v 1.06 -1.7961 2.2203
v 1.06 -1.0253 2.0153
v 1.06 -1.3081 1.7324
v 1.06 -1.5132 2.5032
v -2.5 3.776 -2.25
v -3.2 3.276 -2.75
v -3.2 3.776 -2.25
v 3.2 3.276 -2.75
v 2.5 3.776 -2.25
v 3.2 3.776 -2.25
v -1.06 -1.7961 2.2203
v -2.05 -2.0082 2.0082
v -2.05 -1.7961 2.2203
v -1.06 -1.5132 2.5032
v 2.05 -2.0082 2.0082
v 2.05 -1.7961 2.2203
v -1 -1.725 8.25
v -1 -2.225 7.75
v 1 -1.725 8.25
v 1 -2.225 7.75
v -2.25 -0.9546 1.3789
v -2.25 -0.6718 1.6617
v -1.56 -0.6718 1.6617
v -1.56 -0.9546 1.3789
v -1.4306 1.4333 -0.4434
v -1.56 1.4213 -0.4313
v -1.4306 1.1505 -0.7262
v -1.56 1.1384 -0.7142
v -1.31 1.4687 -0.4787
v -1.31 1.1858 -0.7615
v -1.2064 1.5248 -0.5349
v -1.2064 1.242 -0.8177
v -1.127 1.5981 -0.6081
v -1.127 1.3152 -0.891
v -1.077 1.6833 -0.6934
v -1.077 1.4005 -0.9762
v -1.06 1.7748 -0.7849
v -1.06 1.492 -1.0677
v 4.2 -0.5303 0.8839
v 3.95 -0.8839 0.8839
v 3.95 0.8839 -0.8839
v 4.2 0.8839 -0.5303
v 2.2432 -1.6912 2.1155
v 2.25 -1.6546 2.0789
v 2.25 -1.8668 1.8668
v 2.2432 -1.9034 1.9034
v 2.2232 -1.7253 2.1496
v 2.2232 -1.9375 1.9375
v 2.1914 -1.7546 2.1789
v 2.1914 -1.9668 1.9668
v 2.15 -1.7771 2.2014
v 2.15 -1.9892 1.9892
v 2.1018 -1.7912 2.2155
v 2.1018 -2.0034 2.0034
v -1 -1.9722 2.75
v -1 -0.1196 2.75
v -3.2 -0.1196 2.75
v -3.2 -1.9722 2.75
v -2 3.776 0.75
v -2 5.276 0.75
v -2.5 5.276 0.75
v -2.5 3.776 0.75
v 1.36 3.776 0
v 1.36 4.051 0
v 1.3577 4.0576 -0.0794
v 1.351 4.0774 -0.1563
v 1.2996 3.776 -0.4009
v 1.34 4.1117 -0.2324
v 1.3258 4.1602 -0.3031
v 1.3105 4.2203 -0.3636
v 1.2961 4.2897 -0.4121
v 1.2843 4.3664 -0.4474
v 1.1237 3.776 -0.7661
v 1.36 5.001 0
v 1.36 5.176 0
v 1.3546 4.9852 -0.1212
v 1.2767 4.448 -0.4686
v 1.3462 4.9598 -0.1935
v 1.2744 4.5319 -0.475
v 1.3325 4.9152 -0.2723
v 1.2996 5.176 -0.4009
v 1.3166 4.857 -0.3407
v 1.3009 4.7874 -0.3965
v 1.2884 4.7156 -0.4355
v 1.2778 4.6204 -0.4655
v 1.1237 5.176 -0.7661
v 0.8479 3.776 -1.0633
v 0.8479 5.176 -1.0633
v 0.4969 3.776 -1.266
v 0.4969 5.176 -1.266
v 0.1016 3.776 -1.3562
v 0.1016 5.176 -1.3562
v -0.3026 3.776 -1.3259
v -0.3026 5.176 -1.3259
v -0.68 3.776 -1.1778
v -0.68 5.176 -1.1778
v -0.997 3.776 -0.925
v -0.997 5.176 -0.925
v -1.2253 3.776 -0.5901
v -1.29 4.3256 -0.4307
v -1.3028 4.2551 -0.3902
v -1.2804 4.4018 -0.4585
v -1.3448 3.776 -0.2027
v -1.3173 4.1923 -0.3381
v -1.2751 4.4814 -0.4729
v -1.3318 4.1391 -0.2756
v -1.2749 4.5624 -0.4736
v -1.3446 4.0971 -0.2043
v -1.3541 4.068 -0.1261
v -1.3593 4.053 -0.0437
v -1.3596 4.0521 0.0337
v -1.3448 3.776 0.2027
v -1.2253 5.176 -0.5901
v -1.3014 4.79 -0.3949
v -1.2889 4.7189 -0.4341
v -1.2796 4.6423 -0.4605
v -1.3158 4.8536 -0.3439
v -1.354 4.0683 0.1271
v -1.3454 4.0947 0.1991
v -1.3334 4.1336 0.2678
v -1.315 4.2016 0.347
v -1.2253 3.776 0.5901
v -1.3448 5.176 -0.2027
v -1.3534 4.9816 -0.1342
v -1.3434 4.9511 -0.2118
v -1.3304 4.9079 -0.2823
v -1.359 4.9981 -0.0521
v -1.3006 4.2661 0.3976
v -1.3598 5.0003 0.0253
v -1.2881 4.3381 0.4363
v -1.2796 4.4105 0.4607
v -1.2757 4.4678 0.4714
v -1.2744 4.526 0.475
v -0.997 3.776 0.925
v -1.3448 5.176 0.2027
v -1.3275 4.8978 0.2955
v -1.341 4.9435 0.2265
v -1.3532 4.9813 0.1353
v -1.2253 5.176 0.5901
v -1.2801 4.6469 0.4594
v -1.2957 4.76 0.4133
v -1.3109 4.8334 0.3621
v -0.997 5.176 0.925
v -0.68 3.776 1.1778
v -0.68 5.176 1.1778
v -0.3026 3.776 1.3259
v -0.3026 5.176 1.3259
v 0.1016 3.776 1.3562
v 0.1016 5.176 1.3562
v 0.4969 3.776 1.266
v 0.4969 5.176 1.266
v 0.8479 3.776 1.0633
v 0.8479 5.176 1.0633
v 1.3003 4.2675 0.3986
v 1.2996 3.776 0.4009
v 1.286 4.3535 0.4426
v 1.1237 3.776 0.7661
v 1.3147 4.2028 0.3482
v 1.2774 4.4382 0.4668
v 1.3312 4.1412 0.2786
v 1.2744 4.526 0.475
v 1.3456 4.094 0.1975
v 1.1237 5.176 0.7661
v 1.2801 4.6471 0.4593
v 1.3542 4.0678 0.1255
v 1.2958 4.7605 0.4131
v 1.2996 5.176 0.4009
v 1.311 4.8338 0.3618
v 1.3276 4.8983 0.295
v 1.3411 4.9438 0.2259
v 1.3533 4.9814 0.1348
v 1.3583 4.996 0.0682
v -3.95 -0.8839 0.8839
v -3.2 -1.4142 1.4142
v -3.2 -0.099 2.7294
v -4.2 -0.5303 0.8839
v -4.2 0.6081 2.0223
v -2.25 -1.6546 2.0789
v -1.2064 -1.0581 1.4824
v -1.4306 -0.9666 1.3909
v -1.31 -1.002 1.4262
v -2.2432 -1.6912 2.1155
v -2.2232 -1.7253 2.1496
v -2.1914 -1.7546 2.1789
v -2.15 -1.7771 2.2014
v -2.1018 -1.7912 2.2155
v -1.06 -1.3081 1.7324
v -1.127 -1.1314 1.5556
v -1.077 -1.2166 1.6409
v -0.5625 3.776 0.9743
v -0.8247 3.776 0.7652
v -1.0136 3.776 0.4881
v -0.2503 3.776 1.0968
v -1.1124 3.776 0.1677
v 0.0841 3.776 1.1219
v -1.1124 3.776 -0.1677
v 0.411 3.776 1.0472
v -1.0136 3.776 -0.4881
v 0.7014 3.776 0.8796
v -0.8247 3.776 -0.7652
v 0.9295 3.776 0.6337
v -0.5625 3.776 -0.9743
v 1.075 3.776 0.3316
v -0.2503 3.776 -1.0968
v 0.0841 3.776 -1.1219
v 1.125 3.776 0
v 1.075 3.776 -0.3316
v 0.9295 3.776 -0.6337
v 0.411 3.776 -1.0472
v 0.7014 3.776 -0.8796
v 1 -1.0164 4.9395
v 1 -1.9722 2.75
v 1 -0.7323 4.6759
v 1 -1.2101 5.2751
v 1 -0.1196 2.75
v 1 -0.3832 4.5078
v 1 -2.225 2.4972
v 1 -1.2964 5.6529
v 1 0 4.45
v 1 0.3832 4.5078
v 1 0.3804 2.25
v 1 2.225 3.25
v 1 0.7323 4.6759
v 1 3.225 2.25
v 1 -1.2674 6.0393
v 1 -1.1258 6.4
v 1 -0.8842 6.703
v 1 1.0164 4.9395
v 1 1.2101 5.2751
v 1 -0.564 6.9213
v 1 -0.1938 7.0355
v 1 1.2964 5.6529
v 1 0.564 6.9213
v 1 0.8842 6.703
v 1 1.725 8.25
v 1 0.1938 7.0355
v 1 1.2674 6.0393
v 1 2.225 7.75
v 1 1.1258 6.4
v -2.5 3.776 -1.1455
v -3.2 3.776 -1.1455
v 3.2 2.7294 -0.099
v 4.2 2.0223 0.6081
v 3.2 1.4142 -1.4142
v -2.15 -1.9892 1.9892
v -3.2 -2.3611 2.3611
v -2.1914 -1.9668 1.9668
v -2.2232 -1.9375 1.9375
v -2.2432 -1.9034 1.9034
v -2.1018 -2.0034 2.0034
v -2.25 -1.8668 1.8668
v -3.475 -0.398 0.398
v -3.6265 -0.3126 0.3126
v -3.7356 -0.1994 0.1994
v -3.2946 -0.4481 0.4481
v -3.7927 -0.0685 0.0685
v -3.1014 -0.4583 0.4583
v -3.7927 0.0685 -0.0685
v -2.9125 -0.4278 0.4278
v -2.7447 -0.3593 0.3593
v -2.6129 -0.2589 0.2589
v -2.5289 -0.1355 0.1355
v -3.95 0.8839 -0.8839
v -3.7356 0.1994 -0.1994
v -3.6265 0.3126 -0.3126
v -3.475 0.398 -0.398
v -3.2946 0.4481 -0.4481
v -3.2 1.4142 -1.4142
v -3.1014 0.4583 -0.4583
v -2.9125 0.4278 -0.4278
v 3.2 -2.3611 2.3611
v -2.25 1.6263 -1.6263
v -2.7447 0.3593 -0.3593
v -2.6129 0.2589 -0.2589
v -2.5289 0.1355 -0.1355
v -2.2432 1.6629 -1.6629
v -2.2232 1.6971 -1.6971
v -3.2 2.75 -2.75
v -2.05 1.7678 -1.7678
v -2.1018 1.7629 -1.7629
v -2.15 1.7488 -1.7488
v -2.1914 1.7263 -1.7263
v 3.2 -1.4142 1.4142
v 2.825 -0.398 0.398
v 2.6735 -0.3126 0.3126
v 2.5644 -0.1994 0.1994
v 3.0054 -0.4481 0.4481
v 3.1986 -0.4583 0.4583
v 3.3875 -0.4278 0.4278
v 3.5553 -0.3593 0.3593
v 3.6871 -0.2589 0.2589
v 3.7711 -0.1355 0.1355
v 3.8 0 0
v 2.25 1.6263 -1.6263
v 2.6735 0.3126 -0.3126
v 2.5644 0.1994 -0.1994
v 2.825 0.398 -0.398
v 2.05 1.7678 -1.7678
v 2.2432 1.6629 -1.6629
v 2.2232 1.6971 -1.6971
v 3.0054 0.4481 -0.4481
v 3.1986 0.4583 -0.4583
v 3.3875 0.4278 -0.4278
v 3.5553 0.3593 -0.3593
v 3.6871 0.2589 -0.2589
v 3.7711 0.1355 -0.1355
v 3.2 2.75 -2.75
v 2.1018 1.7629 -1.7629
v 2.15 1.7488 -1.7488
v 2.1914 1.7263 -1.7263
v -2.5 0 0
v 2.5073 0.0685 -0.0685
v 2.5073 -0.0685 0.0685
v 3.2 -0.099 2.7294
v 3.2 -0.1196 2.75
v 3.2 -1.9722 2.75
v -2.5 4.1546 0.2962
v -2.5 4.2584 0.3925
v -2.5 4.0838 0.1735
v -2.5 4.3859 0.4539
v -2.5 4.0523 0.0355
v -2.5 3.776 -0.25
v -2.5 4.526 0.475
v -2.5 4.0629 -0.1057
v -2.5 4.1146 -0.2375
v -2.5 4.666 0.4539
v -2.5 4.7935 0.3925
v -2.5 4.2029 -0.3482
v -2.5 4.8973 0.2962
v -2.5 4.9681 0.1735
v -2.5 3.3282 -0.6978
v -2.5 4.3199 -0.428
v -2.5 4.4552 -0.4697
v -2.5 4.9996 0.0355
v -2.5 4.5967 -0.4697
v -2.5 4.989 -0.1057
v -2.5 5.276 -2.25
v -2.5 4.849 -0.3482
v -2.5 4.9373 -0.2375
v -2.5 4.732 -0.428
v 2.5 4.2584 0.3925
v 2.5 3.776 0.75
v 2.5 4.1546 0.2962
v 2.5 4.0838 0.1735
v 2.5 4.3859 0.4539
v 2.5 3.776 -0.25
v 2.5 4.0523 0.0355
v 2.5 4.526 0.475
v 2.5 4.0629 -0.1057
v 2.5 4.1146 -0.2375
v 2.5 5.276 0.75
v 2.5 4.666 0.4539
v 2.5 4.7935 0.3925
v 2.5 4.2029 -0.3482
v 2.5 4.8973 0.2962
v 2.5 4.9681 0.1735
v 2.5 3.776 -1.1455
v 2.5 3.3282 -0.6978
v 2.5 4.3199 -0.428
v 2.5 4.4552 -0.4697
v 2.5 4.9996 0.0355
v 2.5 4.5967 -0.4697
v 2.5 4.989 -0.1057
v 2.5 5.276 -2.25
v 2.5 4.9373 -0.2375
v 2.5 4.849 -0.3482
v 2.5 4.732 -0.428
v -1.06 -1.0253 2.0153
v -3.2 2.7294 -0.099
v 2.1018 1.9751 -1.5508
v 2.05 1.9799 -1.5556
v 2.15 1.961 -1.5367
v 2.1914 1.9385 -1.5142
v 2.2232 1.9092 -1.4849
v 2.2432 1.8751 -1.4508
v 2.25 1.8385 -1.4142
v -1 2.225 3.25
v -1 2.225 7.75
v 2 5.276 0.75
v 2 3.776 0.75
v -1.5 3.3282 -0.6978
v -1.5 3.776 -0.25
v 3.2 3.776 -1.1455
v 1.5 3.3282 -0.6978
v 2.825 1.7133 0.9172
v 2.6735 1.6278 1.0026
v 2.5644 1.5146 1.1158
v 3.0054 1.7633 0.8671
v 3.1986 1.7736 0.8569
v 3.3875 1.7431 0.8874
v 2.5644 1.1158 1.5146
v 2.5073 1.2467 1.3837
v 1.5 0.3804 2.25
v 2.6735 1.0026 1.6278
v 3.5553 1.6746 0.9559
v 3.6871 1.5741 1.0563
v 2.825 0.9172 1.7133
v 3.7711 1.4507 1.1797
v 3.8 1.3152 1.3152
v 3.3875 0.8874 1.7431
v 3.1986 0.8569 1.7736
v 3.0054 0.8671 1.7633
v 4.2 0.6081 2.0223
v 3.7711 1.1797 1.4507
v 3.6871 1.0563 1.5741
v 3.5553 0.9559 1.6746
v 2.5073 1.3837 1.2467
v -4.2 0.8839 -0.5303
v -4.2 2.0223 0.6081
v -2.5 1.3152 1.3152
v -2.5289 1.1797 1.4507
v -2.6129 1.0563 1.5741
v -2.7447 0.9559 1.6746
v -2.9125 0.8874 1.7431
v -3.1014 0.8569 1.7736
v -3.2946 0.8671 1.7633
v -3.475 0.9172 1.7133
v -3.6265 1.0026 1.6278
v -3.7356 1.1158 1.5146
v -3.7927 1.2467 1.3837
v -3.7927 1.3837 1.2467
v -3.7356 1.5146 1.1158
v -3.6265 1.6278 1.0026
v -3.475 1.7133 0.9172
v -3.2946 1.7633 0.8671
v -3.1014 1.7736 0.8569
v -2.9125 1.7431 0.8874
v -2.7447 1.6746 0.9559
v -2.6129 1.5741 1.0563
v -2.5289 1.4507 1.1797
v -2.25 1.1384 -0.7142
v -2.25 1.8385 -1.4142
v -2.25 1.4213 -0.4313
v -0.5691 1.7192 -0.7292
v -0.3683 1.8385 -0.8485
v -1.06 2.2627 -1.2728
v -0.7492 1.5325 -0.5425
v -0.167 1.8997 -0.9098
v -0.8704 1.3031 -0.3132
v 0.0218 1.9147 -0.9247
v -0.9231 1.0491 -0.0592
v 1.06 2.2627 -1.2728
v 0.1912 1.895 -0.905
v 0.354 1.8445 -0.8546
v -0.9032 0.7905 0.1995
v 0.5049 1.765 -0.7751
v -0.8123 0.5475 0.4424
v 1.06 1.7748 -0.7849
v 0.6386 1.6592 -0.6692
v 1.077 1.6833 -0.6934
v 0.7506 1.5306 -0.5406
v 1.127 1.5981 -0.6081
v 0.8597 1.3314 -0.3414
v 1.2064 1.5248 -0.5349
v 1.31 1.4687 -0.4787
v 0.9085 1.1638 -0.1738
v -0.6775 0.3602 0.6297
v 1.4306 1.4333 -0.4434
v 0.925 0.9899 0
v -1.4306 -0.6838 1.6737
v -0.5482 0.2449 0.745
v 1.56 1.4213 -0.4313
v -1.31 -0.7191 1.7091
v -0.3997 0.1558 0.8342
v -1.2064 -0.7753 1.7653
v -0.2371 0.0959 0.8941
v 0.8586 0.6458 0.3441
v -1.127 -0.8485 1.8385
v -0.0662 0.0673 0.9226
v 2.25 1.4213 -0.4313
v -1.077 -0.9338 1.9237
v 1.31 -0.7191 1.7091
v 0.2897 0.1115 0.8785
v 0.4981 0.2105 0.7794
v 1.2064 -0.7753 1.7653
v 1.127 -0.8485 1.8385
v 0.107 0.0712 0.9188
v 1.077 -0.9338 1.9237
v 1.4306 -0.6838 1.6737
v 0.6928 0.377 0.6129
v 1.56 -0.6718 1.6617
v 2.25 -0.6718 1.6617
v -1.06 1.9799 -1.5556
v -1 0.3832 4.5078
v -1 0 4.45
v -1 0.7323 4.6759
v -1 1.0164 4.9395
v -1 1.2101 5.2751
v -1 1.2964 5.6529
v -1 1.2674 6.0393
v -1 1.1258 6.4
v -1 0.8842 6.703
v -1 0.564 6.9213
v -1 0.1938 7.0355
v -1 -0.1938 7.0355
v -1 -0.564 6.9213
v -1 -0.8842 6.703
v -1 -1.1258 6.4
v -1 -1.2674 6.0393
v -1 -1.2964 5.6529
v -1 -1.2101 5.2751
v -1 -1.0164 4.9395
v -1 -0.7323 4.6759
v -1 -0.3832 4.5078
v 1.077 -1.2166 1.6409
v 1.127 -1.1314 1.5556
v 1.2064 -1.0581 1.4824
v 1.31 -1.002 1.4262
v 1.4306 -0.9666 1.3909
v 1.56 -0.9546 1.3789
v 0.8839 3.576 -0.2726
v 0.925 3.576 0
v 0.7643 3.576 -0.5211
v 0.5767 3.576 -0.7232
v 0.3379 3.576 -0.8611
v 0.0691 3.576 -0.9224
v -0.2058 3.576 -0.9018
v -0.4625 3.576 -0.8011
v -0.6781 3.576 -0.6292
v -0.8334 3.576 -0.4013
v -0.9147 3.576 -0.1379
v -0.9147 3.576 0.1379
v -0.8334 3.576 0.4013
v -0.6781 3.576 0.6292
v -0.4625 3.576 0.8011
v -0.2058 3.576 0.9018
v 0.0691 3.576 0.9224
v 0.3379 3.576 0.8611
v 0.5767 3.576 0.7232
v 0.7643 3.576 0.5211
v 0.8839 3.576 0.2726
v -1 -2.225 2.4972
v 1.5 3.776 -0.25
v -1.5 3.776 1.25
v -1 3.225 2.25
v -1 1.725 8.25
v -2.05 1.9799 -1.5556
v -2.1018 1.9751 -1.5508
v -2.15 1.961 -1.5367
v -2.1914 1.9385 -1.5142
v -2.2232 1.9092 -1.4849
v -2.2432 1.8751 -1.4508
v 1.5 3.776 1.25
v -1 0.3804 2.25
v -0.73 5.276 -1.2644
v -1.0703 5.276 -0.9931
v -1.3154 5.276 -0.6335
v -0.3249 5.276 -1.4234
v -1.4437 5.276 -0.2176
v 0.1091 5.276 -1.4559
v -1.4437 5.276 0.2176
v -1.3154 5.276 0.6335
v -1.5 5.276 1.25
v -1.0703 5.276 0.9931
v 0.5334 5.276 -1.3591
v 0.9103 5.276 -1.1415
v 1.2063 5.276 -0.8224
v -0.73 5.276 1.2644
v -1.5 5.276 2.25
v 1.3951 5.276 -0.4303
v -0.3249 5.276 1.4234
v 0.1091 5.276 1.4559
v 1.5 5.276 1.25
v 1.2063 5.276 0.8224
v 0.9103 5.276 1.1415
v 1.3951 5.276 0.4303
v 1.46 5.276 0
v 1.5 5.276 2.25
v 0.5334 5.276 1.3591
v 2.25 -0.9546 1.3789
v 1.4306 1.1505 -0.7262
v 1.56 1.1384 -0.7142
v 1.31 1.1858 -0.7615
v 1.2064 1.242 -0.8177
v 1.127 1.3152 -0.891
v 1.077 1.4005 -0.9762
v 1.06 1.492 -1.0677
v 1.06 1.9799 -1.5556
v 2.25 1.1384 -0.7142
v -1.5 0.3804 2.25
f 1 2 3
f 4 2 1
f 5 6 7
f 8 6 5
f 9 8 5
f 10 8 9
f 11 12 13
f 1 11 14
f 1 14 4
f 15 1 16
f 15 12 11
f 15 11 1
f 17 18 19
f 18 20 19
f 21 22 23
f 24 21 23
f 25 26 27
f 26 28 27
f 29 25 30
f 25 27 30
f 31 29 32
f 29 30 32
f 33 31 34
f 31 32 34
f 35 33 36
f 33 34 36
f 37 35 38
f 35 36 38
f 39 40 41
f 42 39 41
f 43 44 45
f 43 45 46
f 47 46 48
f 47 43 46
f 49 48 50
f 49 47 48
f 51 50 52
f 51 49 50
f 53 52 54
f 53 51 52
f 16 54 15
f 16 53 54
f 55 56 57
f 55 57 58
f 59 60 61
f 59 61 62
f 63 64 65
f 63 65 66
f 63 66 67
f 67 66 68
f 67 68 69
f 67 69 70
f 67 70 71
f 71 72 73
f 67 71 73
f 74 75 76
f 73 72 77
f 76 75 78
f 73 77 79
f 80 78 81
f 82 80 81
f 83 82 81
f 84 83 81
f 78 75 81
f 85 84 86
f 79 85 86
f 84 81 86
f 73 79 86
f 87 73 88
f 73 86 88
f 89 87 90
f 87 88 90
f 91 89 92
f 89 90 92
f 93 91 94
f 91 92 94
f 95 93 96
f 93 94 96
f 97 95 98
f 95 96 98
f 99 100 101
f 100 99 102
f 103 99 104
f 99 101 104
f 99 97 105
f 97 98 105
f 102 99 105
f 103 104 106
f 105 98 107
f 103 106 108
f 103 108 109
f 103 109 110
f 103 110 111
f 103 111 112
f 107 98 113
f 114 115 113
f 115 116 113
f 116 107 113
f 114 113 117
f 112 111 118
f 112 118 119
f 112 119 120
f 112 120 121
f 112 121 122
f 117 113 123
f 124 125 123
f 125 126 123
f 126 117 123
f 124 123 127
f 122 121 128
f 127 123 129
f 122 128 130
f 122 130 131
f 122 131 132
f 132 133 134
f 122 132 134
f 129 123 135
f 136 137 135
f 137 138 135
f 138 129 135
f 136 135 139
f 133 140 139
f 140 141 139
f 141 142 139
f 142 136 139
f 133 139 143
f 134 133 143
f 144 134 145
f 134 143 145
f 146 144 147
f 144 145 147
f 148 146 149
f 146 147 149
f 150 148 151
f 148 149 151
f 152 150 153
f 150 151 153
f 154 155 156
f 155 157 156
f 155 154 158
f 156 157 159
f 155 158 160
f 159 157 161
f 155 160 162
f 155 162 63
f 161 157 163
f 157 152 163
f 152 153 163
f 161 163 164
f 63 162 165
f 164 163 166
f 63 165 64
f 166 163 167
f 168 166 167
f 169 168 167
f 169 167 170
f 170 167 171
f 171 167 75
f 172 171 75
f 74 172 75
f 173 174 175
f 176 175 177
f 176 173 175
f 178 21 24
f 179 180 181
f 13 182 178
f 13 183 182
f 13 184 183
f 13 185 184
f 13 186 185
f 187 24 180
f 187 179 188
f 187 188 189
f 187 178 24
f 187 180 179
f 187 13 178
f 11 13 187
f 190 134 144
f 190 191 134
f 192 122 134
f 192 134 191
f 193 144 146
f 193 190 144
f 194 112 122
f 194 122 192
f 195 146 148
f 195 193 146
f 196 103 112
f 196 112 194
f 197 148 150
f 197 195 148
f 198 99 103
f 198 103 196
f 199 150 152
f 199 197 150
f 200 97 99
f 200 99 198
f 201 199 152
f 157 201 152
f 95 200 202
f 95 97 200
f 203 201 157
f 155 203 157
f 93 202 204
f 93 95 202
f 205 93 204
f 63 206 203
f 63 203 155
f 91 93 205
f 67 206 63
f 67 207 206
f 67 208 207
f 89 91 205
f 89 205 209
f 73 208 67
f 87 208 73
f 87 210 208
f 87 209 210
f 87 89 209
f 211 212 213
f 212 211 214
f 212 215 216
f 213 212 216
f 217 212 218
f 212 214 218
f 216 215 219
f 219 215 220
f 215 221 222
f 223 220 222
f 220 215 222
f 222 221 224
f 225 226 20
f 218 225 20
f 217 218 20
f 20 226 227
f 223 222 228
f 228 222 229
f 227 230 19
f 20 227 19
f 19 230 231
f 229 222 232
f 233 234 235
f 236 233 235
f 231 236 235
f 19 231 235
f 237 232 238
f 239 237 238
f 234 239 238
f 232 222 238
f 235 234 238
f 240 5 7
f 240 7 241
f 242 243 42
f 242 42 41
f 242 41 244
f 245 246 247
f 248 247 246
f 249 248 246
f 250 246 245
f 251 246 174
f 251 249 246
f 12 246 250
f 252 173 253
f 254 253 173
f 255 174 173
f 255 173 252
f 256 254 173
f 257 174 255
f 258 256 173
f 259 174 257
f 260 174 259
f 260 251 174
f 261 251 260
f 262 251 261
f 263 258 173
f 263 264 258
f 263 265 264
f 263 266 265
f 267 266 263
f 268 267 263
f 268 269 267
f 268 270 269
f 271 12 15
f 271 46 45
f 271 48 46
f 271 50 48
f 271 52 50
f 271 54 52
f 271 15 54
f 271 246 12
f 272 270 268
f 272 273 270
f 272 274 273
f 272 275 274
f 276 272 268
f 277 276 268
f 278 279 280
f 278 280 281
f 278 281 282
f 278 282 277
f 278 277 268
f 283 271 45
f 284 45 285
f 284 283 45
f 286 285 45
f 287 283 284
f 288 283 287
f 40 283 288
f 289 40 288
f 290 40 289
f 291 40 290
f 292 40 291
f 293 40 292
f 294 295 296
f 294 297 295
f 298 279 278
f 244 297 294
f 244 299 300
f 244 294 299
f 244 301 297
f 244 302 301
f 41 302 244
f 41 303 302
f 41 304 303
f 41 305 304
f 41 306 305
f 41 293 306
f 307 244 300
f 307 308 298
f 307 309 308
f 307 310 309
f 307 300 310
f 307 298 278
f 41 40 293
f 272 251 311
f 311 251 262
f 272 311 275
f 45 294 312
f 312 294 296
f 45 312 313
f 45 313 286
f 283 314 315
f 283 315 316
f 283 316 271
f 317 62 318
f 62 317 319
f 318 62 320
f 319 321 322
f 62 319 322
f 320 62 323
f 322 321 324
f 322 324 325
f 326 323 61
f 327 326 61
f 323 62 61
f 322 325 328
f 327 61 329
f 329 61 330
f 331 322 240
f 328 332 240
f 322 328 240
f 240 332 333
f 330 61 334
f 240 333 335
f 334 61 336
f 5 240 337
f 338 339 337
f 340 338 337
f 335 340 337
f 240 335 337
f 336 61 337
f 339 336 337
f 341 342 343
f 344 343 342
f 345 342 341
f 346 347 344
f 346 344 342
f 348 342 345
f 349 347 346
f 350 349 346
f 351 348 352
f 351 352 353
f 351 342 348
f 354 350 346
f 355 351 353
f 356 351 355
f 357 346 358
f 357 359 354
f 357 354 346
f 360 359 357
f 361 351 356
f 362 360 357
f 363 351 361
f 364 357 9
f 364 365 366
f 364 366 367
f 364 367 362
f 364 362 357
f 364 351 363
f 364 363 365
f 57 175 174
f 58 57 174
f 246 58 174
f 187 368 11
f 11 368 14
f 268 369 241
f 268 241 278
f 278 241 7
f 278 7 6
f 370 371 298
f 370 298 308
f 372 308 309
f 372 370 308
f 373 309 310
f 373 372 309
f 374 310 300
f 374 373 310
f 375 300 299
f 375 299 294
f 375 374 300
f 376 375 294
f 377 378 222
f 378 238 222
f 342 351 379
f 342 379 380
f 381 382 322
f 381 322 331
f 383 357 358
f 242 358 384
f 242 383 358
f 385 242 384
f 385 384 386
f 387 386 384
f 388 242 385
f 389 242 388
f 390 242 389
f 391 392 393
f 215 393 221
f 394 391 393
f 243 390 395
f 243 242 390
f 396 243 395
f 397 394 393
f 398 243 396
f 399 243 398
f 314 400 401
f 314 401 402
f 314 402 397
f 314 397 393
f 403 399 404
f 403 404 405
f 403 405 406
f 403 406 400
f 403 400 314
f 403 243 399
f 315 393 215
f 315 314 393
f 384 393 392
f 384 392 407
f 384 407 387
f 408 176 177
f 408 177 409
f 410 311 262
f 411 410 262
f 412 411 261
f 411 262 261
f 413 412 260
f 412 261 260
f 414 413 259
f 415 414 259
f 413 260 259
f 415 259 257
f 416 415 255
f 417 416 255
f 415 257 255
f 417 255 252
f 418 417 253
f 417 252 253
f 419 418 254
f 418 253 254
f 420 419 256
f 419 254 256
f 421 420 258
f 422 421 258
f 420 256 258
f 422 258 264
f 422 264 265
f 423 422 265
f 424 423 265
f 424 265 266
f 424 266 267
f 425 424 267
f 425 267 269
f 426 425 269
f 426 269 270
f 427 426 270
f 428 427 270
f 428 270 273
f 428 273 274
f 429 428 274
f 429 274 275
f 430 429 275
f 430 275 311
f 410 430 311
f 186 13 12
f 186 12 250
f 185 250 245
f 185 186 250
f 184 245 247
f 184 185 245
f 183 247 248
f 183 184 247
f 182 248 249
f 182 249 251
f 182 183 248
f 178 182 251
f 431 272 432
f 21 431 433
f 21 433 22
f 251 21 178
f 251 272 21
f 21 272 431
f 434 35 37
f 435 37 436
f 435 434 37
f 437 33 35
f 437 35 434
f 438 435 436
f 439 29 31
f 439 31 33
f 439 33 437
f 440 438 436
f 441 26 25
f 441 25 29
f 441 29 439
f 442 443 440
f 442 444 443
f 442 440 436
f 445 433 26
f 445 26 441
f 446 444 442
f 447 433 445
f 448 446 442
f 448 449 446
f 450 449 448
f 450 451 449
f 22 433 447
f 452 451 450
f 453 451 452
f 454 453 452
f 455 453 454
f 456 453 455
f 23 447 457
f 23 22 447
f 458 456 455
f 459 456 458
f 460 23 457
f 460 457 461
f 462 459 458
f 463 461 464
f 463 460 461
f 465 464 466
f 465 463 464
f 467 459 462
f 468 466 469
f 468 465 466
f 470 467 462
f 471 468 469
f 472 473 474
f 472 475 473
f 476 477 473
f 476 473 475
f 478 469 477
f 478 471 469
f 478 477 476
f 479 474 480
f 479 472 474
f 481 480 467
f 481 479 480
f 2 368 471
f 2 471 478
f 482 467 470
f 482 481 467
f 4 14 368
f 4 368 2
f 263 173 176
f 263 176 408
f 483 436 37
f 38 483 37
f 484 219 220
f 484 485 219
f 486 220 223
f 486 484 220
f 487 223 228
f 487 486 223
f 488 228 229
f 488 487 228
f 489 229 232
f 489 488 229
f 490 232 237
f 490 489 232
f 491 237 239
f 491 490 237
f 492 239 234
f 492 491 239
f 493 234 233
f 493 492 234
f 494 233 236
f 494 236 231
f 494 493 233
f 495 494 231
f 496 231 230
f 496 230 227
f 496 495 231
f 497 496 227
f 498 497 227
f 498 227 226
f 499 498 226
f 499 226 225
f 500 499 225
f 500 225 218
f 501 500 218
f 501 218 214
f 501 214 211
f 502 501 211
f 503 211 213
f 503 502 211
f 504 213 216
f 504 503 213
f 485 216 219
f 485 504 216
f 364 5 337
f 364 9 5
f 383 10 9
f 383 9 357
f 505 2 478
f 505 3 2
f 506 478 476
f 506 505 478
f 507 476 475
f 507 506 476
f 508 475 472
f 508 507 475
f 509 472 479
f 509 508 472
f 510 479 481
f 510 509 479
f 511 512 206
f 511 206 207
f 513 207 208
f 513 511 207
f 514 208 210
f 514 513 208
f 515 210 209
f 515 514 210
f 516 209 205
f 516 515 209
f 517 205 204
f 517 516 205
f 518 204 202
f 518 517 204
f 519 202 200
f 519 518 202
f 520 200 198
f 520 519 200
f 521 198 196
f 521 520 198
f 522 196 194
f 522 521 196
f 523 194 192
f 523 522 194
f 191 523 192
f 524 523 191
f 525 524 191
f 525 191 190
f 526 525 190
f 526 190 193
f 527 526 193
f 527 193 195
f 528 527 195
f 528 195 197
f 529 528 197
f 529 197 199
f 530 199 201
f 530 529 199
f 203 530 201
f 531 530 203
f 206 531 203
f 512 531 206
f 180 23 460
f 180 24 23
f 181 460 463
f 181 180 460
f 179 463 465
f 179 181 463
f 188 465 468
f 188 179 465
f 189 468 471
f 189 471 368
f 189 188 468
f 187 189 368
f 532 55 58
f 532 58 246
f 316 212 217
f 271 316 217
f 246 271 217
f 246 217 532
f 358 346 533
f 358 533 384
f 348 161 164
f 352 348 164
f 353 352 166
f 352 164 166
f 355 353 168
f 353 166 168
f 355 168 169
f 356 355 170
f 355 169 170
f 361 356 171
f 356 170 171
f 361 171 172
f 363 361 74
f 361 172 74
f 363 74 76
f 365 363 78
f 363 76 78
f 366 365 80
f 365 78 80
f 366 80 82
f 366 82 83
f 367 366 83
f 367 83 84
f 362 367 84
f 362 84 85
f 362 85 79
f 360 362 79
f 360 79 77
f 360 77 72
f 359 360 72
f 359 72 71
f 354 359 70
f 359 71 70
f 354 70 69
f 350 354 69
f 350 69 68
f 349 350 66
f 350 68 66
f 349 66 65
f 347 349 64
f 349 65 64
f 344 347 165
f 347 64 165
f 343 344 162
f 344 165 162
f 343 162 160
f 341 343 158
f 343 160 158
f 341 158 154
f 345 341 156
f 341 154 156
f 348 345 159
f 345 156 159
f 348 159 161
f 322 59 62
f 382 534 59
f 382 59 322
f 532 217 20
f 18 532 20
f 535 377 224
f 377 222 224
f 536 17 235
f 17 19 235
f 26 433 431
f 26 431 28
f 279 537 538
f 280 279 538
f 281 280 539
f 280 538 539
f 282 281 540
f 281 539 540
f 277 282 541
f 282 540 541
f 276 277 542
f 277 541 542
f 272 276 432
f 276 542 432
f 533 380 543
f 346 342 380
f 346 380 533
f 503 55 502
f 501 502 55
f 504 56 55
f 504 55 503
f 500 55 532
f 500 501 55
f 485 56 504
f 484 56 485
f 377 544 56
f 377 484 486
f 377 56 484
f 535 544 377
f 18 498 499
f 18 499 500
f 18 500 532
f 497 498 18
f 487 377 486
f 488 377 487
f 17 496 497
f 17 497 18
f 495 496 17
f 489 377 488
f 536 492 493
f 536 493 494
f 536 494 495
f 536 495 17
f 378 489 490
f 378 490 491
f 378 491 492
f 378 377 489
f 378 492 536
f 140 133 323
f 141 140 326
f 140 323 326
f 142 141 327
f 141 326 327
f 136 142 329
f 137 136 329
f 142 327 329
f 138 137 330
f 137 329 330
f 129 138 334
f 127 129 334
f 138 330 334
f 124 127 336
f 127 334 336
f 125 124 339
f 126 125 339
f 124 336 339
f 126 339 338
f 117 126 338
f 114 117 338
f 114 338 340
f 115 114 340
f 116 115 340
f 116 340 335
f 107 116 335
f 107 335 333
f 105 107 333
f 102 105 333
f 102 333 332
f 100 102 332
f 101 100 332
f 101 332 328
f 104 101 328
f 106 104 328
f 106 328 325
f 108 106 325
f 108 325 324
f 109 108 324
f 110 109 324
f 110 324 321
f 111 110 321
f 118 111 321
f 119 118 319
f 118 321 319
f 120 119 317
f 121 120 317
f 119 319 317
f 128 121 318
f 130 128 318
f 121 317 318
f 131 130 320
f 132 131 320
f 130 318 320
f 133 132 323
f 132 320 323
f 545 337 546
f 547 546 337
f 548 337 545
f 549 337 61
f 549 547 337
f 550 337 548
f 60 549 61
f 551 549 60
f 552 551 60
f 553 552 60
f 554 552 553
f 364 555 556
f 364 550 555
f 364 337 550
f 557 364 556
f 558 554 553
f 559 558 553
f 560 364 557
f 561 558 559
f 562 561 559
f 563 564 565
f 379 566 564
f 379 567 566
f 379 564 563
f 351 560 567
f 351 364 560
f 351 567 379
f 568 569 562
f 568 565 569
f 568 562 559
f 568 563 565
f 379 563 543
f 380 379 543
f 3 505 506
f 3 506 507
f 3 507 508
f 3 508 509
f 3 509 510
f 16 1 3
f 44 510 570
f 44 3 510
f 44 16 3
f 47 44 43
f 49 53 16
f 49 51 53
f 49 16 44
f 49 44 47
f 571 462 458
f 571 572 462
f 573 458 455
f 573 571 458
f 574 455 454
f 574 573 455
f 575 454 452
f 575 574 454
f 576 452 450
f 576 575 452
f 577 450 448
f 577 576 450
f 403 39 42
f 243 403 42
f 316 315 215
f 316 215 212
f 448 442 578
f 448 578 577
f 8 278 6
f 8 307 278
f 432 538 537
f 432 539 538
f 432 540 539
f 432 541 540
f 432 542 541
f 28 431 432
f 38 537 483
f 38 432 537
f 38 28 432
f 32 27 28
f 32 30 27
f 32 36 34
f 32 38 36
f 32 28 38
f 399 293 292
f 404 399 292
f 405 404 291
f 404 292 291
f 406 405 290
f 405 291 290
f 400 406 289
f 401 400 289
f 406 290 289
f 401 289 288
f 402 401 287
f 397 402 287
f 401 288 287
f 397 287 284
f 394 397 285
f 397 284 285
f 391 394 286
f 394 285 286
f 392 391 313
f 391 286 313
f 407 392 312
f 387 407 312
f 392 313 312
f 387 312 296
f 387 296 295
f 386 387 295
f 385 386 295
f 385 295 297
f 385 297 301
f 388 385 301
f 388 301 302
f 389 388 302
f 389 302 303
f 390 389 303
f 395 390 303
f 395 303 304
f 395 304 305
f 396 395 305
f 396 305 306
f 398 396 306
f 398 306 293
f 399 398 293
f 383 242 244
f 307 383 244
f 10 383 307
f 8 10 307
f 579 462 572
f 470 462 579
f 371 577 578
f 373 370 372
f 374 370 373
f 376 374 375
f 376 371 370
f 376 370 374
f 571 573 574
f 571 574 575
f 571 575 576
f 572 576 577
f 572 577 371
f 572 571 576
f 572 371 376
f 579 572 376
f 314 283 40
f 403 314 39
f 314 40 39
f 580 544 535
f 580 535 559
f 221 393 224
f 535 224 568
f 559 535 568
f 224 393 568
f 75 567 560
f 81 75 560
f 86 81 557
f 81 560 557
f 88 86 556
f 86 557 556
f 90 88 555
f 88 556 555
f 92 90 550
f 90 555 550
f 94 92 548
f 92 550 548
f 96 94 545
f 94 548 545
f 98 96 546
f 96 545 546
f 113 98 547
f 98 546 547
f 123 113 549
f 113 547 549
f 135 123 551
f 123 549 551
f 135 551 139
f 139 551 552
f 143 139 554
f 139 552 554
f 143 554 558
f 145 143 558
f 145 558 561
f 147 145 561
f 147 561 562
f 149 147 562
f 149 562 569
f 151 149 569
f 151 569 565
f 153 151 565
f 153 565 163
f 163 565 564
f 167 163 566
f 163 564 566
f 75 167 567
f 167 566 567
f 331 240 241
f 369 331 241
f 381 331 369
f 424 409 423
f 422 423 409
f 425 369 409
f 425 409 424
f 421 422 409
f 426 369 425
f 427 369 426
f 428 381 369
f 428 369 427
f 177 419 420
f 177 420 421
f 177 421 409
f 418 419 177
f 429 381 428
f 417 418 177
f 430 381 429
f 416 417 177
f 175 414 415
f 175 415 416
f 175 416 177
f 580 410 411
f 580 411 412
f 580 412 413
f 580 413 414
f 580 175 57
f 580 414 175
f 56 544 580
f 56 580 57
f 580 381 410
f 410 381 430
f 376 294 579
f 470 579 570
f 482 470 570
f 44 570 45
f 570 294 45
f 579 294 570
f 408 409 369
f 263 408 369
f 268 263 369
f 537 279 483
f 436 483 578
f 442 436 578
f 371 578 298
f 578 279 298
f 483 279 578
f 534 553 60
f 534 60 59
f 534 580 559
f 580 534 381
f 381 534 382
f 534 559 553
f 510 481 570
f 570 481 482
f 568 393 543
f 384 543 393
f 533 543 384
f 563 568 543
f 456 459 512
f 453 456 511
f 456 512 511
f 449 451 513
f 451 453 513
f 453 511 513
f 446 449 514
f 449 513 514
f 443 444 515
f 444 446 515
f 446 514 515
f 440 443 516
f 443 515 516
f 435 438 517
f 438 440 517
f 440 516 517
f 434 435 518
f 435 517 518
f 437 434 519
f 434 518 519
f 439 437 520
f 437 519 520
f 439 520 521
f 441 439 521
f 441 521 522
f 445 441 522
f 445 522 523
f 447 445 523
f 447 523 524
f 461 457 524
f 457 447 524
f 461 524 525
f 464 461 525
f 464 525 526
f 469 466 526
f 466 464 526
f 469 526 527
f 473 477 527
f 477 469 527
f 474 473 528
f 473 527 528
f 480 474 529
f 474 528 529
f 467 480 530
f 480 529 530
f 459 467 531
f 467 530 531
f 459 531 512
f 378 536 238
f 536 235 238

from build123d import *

# Parameters (mm, degrees)
SKETCH2_W                = 4.5
SKETCH2_H                = 5.27595021
BOSS_EXTRUDE1_DEPTH      = 1.5
BOSS_EXTRUDE2_DEPTH      = 3.2
CUT_EXTRUDE1_DEPTH       = 7.4
SKETCH5_R                = 1.3
BOSS_EXTRUDE3_DEPTH      = 1
BOSS_EXTRUDE4_DEPTH      = 1.86
SKETCH7_R                = 0.65
CUT_EXTRUDE2_DEPTH       = 10.564291115
SKETCH8_W                = 4.5
SKETCH8_H                = 5.34
CUT_EXTRUDE3_DEPTH       = 0.7
FILLET1_R                = 0.2
SKETCH9_W                = 1.19
SKETCH9_H                = 1.19
BOSS_EXTRUDE5_DEPTH      = 0.4
FILLET2_R                = 0.5
BOSS_EXTRUDE6_DEPTH      = 2.5
SKETCH10_R               = 0.925
CUT_EXTRUDE4_DEPTH       = 1
CUT_EXTRUDE4_DEPTH_BACK  = 8.63704148
M1_2X0_25_TAPPED_HOLE1_D = 0.95
CHAMFER1_SIZE            = 0.5
SKETCH14_R               = 1.36
CUT_EXTRUDE5_DEPTH       = 1.5
CHAMFER2_SIZE            = 0.2
CHAMFER3_SIZE            = 0.1
CHAMFER4_SIZE            = 0.25


with BuildPart() as part:
    # Sketch2 → Boss-Extrude1 (new body, symmetric)
    with BuildSketch(Plane(origin=(0, 0, 0), x_dir=(0, 0, -1), z_dir=(1, 0, 0))):
        with Locations((0, 2.637975105)):
            Rectangle(SKETCH2_W, SKETCH2_H)
    extrude(amount=BOSS_EXTRUDE1_DEPTH, both=True)

    # Sketch3 → Boss-Extrude2 (add, symmetric)
    with BuildSketch(Plane(origin=(0, 0, 0), x_dir=(0, 0, -1), z_dir=(1, 0, 0))):
        Polygon((0, 0), (2.75, 2.75), (2.75, 3.27595021), (2.25, 3.77595021), (1.145512984, 3.77595021), (-2.75, -0.119562774), (-2.75, -1.972182541), (-2.36109127, -2.36109127), align=None)
    extrude(amount=BOSS_EXTRUDE2_DEPTH, both=True)

    # Sketch4 → Cut-Extrude1 (cut, through all)
    with BuildSketch(Plane(origin=(3.2, 0, 0), x_dir=(0, 0, -1), z_dir=(1, 0, 0))):
        Polygon((2.25, 2.25), (0, 0), (2.25, 0), align=None)
    extrude(amount=-CUT_EXTRUDE1_DEPTH, mode=Mode.SUBTRACT)

    # Sketch5 → Boss-Extrude3 (add, symmetric)
    with BuildSketch(Plane(origin=(0, 0, 0), x_dir=(0, 0, -1), z_dir=(1, 0, 0))):
        Polygon((-2.497182541, -2.225), (-7.75, -2.225), (-8.25, -1.725), (-8.25, 1.725), (-7.75, 2.225), (-3.25, 2.225), (-2.25, 3.225), (-2.25, 0.380437226), (-2.75, -0.119562774), (-2.75, -1.972182541), align=None)
        with Locations((-5.75, 0)):
            Circle(SKETCH5_R, mode=Mode.SUBTRACT)
    extrude(amount=BOSS_EXTRUDE3_DEPTH, both=True)

    # Sketch6 → Boss-Extrude4 (add)
    with BuildSketch(Plane(origin=(0, 0, 0), x_dir=(1, 0, 0), z_dir=(0, -0.707106781, -0.707106781))):
        Polygon((-3.2, 2), (-4.2, 1), (-4.2, -1), (-3.2, -2), align=None)
        Polygon((3.2, -2), (3.2, 2), (4.2, 1), (4.2, -1), align=None)
    extrude(amount=-BOSS_EXTRUDE4_DEPTH)

    # Sketch7 → Cut-Extrude2 (cut, through all)
    with BuildSketch(Plane(origin=(0, 0, 0), x_dir=(1, 0, 0), z_dir=(0, -0.707106781, -0.707106781))):
        with Locations((-3.15, 0)):
            Circle(SKETCH7_R)
        with Locations((3.15, 0)):
            Circle(SKETCH7_R)
    extrude(amount=-CUT_EXTRUDE2_DEPTH, mode=Mode.SUBTRACT)

    # Sketch8 → Cut-Extrude3 (cut)
    with BuildSketch(Plane(origin=(0, 0, 0), x_dir=(1, 0, 0), z_dir=(0, -0.707106781, -0.707106781))):
        with Locations((0, 0.17)):
            Rectangle(SKETCH8_W, SKETCH8_H)
    extrude(amount=-CUT_EXTRUDE3_DEPTH, mode=Mode.SUBTRACT)

    # Fillet1
    fillet1_edges = [part.edges().sort_by_distance(p)[0] for p in [
        (-2.25, 2.015254326, -1.52027958),
        (-2.25, -1.760695885, 2.255670632),
        (2.25, -1.760695885, 2.255670632),
        (2.25, 2.015254326, -1.52027958),
    ]]
    fillet(fillet1_edges, radius=FILLET1_R)

    # Sketch9 → Boss-Extrude5 (add)
    with BuildSketch(Plane(origin=(0, 0.494974747, 0.494974747), x_dir=(1, 0, 0), z_dir=(0, -0.707106781, -0.707106781))):
        with Locations((-1.655, 2.245)):
            Rectangle(SKETCH9_W, SKETCH9_H)
        with Locations((1.655, 2.245)):
            Rectangle(SKETCH9_W, SKETCH9_H)
        with Locations((1.655, -1.905)):
            Rectangle(SKETCH9_W, SKETCH9_H)
        with Locations((-1.655, -1.905)):
            Rectangle(SKETCH9_W, SKETCH9_H)
    extrude(amount=BOSS_EXTRUDE5_DEPTH)

    # Fillet2
    fillet2_edges = [part.edges().sort_by_distance(p)[0] for p in [
        (-1.06, -0.813172798, 1.52027958),
        (1.06, -0.813172798, 1.52027958),
        (1.06, 1.279863274, -0.572756493),
        (-1.06, 1.279863274, -0.572756493),
    ]]
    fillet(fillet2_edges, radius=FILLET2_R)

    # Sketch11 → Boss-Extrude6 (add, symmetric)
    with BuildSketch(Plane(origin=(0, 0, 0), x_dir=(0, 0, -1), z_dir=(1, 0, 0))):
        Polygon((2.25, 5.27595021), (-0.75, 5.27595021), (-0.75, 3.77595021), (0.25, 3.77595021), (0.697756492, 3.328193718), (1.145512984, 3.77595021), (2.25, 3.77595021), align=None)
    extrude(amount=BOSS_EXTRUDE6_DEPTH, both=True)

    # Sketch10 → Cut-Extrude4 (cut, two sides)
    with BuildSketch(Plane(origin=(0, 5.27595021, 0), x_dir=(1, 0, 0), z_dir=(0, 1, 0))) as cut_extrude4_sk:
        Circle(SKETCH10_R)
    extrude(amount=CUT_EXTRUDE4_DEPTH, mode=Mode.SUBTRACT)
    extrude(cut_extrude4_sk.sketch, amount=-CUT_EXTRUDE4_DEPTH_BACK, mode=Mode.SUBTRACT)

    # M1.2x0.25 Tapped Hole1 (through all)
    with Locations(Plane(origin=(2.5, 0, 0), x_dir=(0, 0, -1), z_dir=(1, 0, 0))):
        with Locations((0, 4.52595021)):
            Hole(M1_2X0_25_TAPPED_HOLE1_D / 2)

    # Chamfer1
    chamfer1_edges = [part.edges().sort_by_distance(p)[0] for p in [
        (1.5, 4.52595021, 0.75),
        (-1.5, 4.52595021, 0.75),
    ]]
    chamfer(chamfer1_edges, length=CHAMFER1_SIZE)

    # Sketch14 → Cut-Extrude5 (cut)
    with BuildSketch(Plane(origin=(0, 5.27595021, 0), x_dir=(1, 0, 0), z_dir=(0, 1, 0))):
        Circle(SKETCH14_R)
    extrude(amount=-CUT_EXTRUDE5_DEPTH, mode=Mode.SUBTRACT)

    # Chamfer2
    chamfer2_edges = [part.edges().sort_by_distance(p)[0] for p in [
        (-0.925, 3.77595021, 0),
    ]]
    chamfer(chamfer2_edges, length=CHAMFER2_SIZE)

    # Chamfer3
    chamfer3_edges = [part.edges().sort_by_distance(p)[0] for p in [
        (-1.36, 5.27595021, 0),
    ]]
    chamfer(chamfer3_edges, length=CHAMFER3_SIZE)

    # Chamfer4
    chamfer4_edges = [part.edges().sort_by_distance(p)[0] for p in [
        (4.2, 0, 0),
        (-4.2, 0, 0),
    ]]
    chamfer(chamfer4_edges, length=CHAMFER4_SIZE)


solid = part.part
